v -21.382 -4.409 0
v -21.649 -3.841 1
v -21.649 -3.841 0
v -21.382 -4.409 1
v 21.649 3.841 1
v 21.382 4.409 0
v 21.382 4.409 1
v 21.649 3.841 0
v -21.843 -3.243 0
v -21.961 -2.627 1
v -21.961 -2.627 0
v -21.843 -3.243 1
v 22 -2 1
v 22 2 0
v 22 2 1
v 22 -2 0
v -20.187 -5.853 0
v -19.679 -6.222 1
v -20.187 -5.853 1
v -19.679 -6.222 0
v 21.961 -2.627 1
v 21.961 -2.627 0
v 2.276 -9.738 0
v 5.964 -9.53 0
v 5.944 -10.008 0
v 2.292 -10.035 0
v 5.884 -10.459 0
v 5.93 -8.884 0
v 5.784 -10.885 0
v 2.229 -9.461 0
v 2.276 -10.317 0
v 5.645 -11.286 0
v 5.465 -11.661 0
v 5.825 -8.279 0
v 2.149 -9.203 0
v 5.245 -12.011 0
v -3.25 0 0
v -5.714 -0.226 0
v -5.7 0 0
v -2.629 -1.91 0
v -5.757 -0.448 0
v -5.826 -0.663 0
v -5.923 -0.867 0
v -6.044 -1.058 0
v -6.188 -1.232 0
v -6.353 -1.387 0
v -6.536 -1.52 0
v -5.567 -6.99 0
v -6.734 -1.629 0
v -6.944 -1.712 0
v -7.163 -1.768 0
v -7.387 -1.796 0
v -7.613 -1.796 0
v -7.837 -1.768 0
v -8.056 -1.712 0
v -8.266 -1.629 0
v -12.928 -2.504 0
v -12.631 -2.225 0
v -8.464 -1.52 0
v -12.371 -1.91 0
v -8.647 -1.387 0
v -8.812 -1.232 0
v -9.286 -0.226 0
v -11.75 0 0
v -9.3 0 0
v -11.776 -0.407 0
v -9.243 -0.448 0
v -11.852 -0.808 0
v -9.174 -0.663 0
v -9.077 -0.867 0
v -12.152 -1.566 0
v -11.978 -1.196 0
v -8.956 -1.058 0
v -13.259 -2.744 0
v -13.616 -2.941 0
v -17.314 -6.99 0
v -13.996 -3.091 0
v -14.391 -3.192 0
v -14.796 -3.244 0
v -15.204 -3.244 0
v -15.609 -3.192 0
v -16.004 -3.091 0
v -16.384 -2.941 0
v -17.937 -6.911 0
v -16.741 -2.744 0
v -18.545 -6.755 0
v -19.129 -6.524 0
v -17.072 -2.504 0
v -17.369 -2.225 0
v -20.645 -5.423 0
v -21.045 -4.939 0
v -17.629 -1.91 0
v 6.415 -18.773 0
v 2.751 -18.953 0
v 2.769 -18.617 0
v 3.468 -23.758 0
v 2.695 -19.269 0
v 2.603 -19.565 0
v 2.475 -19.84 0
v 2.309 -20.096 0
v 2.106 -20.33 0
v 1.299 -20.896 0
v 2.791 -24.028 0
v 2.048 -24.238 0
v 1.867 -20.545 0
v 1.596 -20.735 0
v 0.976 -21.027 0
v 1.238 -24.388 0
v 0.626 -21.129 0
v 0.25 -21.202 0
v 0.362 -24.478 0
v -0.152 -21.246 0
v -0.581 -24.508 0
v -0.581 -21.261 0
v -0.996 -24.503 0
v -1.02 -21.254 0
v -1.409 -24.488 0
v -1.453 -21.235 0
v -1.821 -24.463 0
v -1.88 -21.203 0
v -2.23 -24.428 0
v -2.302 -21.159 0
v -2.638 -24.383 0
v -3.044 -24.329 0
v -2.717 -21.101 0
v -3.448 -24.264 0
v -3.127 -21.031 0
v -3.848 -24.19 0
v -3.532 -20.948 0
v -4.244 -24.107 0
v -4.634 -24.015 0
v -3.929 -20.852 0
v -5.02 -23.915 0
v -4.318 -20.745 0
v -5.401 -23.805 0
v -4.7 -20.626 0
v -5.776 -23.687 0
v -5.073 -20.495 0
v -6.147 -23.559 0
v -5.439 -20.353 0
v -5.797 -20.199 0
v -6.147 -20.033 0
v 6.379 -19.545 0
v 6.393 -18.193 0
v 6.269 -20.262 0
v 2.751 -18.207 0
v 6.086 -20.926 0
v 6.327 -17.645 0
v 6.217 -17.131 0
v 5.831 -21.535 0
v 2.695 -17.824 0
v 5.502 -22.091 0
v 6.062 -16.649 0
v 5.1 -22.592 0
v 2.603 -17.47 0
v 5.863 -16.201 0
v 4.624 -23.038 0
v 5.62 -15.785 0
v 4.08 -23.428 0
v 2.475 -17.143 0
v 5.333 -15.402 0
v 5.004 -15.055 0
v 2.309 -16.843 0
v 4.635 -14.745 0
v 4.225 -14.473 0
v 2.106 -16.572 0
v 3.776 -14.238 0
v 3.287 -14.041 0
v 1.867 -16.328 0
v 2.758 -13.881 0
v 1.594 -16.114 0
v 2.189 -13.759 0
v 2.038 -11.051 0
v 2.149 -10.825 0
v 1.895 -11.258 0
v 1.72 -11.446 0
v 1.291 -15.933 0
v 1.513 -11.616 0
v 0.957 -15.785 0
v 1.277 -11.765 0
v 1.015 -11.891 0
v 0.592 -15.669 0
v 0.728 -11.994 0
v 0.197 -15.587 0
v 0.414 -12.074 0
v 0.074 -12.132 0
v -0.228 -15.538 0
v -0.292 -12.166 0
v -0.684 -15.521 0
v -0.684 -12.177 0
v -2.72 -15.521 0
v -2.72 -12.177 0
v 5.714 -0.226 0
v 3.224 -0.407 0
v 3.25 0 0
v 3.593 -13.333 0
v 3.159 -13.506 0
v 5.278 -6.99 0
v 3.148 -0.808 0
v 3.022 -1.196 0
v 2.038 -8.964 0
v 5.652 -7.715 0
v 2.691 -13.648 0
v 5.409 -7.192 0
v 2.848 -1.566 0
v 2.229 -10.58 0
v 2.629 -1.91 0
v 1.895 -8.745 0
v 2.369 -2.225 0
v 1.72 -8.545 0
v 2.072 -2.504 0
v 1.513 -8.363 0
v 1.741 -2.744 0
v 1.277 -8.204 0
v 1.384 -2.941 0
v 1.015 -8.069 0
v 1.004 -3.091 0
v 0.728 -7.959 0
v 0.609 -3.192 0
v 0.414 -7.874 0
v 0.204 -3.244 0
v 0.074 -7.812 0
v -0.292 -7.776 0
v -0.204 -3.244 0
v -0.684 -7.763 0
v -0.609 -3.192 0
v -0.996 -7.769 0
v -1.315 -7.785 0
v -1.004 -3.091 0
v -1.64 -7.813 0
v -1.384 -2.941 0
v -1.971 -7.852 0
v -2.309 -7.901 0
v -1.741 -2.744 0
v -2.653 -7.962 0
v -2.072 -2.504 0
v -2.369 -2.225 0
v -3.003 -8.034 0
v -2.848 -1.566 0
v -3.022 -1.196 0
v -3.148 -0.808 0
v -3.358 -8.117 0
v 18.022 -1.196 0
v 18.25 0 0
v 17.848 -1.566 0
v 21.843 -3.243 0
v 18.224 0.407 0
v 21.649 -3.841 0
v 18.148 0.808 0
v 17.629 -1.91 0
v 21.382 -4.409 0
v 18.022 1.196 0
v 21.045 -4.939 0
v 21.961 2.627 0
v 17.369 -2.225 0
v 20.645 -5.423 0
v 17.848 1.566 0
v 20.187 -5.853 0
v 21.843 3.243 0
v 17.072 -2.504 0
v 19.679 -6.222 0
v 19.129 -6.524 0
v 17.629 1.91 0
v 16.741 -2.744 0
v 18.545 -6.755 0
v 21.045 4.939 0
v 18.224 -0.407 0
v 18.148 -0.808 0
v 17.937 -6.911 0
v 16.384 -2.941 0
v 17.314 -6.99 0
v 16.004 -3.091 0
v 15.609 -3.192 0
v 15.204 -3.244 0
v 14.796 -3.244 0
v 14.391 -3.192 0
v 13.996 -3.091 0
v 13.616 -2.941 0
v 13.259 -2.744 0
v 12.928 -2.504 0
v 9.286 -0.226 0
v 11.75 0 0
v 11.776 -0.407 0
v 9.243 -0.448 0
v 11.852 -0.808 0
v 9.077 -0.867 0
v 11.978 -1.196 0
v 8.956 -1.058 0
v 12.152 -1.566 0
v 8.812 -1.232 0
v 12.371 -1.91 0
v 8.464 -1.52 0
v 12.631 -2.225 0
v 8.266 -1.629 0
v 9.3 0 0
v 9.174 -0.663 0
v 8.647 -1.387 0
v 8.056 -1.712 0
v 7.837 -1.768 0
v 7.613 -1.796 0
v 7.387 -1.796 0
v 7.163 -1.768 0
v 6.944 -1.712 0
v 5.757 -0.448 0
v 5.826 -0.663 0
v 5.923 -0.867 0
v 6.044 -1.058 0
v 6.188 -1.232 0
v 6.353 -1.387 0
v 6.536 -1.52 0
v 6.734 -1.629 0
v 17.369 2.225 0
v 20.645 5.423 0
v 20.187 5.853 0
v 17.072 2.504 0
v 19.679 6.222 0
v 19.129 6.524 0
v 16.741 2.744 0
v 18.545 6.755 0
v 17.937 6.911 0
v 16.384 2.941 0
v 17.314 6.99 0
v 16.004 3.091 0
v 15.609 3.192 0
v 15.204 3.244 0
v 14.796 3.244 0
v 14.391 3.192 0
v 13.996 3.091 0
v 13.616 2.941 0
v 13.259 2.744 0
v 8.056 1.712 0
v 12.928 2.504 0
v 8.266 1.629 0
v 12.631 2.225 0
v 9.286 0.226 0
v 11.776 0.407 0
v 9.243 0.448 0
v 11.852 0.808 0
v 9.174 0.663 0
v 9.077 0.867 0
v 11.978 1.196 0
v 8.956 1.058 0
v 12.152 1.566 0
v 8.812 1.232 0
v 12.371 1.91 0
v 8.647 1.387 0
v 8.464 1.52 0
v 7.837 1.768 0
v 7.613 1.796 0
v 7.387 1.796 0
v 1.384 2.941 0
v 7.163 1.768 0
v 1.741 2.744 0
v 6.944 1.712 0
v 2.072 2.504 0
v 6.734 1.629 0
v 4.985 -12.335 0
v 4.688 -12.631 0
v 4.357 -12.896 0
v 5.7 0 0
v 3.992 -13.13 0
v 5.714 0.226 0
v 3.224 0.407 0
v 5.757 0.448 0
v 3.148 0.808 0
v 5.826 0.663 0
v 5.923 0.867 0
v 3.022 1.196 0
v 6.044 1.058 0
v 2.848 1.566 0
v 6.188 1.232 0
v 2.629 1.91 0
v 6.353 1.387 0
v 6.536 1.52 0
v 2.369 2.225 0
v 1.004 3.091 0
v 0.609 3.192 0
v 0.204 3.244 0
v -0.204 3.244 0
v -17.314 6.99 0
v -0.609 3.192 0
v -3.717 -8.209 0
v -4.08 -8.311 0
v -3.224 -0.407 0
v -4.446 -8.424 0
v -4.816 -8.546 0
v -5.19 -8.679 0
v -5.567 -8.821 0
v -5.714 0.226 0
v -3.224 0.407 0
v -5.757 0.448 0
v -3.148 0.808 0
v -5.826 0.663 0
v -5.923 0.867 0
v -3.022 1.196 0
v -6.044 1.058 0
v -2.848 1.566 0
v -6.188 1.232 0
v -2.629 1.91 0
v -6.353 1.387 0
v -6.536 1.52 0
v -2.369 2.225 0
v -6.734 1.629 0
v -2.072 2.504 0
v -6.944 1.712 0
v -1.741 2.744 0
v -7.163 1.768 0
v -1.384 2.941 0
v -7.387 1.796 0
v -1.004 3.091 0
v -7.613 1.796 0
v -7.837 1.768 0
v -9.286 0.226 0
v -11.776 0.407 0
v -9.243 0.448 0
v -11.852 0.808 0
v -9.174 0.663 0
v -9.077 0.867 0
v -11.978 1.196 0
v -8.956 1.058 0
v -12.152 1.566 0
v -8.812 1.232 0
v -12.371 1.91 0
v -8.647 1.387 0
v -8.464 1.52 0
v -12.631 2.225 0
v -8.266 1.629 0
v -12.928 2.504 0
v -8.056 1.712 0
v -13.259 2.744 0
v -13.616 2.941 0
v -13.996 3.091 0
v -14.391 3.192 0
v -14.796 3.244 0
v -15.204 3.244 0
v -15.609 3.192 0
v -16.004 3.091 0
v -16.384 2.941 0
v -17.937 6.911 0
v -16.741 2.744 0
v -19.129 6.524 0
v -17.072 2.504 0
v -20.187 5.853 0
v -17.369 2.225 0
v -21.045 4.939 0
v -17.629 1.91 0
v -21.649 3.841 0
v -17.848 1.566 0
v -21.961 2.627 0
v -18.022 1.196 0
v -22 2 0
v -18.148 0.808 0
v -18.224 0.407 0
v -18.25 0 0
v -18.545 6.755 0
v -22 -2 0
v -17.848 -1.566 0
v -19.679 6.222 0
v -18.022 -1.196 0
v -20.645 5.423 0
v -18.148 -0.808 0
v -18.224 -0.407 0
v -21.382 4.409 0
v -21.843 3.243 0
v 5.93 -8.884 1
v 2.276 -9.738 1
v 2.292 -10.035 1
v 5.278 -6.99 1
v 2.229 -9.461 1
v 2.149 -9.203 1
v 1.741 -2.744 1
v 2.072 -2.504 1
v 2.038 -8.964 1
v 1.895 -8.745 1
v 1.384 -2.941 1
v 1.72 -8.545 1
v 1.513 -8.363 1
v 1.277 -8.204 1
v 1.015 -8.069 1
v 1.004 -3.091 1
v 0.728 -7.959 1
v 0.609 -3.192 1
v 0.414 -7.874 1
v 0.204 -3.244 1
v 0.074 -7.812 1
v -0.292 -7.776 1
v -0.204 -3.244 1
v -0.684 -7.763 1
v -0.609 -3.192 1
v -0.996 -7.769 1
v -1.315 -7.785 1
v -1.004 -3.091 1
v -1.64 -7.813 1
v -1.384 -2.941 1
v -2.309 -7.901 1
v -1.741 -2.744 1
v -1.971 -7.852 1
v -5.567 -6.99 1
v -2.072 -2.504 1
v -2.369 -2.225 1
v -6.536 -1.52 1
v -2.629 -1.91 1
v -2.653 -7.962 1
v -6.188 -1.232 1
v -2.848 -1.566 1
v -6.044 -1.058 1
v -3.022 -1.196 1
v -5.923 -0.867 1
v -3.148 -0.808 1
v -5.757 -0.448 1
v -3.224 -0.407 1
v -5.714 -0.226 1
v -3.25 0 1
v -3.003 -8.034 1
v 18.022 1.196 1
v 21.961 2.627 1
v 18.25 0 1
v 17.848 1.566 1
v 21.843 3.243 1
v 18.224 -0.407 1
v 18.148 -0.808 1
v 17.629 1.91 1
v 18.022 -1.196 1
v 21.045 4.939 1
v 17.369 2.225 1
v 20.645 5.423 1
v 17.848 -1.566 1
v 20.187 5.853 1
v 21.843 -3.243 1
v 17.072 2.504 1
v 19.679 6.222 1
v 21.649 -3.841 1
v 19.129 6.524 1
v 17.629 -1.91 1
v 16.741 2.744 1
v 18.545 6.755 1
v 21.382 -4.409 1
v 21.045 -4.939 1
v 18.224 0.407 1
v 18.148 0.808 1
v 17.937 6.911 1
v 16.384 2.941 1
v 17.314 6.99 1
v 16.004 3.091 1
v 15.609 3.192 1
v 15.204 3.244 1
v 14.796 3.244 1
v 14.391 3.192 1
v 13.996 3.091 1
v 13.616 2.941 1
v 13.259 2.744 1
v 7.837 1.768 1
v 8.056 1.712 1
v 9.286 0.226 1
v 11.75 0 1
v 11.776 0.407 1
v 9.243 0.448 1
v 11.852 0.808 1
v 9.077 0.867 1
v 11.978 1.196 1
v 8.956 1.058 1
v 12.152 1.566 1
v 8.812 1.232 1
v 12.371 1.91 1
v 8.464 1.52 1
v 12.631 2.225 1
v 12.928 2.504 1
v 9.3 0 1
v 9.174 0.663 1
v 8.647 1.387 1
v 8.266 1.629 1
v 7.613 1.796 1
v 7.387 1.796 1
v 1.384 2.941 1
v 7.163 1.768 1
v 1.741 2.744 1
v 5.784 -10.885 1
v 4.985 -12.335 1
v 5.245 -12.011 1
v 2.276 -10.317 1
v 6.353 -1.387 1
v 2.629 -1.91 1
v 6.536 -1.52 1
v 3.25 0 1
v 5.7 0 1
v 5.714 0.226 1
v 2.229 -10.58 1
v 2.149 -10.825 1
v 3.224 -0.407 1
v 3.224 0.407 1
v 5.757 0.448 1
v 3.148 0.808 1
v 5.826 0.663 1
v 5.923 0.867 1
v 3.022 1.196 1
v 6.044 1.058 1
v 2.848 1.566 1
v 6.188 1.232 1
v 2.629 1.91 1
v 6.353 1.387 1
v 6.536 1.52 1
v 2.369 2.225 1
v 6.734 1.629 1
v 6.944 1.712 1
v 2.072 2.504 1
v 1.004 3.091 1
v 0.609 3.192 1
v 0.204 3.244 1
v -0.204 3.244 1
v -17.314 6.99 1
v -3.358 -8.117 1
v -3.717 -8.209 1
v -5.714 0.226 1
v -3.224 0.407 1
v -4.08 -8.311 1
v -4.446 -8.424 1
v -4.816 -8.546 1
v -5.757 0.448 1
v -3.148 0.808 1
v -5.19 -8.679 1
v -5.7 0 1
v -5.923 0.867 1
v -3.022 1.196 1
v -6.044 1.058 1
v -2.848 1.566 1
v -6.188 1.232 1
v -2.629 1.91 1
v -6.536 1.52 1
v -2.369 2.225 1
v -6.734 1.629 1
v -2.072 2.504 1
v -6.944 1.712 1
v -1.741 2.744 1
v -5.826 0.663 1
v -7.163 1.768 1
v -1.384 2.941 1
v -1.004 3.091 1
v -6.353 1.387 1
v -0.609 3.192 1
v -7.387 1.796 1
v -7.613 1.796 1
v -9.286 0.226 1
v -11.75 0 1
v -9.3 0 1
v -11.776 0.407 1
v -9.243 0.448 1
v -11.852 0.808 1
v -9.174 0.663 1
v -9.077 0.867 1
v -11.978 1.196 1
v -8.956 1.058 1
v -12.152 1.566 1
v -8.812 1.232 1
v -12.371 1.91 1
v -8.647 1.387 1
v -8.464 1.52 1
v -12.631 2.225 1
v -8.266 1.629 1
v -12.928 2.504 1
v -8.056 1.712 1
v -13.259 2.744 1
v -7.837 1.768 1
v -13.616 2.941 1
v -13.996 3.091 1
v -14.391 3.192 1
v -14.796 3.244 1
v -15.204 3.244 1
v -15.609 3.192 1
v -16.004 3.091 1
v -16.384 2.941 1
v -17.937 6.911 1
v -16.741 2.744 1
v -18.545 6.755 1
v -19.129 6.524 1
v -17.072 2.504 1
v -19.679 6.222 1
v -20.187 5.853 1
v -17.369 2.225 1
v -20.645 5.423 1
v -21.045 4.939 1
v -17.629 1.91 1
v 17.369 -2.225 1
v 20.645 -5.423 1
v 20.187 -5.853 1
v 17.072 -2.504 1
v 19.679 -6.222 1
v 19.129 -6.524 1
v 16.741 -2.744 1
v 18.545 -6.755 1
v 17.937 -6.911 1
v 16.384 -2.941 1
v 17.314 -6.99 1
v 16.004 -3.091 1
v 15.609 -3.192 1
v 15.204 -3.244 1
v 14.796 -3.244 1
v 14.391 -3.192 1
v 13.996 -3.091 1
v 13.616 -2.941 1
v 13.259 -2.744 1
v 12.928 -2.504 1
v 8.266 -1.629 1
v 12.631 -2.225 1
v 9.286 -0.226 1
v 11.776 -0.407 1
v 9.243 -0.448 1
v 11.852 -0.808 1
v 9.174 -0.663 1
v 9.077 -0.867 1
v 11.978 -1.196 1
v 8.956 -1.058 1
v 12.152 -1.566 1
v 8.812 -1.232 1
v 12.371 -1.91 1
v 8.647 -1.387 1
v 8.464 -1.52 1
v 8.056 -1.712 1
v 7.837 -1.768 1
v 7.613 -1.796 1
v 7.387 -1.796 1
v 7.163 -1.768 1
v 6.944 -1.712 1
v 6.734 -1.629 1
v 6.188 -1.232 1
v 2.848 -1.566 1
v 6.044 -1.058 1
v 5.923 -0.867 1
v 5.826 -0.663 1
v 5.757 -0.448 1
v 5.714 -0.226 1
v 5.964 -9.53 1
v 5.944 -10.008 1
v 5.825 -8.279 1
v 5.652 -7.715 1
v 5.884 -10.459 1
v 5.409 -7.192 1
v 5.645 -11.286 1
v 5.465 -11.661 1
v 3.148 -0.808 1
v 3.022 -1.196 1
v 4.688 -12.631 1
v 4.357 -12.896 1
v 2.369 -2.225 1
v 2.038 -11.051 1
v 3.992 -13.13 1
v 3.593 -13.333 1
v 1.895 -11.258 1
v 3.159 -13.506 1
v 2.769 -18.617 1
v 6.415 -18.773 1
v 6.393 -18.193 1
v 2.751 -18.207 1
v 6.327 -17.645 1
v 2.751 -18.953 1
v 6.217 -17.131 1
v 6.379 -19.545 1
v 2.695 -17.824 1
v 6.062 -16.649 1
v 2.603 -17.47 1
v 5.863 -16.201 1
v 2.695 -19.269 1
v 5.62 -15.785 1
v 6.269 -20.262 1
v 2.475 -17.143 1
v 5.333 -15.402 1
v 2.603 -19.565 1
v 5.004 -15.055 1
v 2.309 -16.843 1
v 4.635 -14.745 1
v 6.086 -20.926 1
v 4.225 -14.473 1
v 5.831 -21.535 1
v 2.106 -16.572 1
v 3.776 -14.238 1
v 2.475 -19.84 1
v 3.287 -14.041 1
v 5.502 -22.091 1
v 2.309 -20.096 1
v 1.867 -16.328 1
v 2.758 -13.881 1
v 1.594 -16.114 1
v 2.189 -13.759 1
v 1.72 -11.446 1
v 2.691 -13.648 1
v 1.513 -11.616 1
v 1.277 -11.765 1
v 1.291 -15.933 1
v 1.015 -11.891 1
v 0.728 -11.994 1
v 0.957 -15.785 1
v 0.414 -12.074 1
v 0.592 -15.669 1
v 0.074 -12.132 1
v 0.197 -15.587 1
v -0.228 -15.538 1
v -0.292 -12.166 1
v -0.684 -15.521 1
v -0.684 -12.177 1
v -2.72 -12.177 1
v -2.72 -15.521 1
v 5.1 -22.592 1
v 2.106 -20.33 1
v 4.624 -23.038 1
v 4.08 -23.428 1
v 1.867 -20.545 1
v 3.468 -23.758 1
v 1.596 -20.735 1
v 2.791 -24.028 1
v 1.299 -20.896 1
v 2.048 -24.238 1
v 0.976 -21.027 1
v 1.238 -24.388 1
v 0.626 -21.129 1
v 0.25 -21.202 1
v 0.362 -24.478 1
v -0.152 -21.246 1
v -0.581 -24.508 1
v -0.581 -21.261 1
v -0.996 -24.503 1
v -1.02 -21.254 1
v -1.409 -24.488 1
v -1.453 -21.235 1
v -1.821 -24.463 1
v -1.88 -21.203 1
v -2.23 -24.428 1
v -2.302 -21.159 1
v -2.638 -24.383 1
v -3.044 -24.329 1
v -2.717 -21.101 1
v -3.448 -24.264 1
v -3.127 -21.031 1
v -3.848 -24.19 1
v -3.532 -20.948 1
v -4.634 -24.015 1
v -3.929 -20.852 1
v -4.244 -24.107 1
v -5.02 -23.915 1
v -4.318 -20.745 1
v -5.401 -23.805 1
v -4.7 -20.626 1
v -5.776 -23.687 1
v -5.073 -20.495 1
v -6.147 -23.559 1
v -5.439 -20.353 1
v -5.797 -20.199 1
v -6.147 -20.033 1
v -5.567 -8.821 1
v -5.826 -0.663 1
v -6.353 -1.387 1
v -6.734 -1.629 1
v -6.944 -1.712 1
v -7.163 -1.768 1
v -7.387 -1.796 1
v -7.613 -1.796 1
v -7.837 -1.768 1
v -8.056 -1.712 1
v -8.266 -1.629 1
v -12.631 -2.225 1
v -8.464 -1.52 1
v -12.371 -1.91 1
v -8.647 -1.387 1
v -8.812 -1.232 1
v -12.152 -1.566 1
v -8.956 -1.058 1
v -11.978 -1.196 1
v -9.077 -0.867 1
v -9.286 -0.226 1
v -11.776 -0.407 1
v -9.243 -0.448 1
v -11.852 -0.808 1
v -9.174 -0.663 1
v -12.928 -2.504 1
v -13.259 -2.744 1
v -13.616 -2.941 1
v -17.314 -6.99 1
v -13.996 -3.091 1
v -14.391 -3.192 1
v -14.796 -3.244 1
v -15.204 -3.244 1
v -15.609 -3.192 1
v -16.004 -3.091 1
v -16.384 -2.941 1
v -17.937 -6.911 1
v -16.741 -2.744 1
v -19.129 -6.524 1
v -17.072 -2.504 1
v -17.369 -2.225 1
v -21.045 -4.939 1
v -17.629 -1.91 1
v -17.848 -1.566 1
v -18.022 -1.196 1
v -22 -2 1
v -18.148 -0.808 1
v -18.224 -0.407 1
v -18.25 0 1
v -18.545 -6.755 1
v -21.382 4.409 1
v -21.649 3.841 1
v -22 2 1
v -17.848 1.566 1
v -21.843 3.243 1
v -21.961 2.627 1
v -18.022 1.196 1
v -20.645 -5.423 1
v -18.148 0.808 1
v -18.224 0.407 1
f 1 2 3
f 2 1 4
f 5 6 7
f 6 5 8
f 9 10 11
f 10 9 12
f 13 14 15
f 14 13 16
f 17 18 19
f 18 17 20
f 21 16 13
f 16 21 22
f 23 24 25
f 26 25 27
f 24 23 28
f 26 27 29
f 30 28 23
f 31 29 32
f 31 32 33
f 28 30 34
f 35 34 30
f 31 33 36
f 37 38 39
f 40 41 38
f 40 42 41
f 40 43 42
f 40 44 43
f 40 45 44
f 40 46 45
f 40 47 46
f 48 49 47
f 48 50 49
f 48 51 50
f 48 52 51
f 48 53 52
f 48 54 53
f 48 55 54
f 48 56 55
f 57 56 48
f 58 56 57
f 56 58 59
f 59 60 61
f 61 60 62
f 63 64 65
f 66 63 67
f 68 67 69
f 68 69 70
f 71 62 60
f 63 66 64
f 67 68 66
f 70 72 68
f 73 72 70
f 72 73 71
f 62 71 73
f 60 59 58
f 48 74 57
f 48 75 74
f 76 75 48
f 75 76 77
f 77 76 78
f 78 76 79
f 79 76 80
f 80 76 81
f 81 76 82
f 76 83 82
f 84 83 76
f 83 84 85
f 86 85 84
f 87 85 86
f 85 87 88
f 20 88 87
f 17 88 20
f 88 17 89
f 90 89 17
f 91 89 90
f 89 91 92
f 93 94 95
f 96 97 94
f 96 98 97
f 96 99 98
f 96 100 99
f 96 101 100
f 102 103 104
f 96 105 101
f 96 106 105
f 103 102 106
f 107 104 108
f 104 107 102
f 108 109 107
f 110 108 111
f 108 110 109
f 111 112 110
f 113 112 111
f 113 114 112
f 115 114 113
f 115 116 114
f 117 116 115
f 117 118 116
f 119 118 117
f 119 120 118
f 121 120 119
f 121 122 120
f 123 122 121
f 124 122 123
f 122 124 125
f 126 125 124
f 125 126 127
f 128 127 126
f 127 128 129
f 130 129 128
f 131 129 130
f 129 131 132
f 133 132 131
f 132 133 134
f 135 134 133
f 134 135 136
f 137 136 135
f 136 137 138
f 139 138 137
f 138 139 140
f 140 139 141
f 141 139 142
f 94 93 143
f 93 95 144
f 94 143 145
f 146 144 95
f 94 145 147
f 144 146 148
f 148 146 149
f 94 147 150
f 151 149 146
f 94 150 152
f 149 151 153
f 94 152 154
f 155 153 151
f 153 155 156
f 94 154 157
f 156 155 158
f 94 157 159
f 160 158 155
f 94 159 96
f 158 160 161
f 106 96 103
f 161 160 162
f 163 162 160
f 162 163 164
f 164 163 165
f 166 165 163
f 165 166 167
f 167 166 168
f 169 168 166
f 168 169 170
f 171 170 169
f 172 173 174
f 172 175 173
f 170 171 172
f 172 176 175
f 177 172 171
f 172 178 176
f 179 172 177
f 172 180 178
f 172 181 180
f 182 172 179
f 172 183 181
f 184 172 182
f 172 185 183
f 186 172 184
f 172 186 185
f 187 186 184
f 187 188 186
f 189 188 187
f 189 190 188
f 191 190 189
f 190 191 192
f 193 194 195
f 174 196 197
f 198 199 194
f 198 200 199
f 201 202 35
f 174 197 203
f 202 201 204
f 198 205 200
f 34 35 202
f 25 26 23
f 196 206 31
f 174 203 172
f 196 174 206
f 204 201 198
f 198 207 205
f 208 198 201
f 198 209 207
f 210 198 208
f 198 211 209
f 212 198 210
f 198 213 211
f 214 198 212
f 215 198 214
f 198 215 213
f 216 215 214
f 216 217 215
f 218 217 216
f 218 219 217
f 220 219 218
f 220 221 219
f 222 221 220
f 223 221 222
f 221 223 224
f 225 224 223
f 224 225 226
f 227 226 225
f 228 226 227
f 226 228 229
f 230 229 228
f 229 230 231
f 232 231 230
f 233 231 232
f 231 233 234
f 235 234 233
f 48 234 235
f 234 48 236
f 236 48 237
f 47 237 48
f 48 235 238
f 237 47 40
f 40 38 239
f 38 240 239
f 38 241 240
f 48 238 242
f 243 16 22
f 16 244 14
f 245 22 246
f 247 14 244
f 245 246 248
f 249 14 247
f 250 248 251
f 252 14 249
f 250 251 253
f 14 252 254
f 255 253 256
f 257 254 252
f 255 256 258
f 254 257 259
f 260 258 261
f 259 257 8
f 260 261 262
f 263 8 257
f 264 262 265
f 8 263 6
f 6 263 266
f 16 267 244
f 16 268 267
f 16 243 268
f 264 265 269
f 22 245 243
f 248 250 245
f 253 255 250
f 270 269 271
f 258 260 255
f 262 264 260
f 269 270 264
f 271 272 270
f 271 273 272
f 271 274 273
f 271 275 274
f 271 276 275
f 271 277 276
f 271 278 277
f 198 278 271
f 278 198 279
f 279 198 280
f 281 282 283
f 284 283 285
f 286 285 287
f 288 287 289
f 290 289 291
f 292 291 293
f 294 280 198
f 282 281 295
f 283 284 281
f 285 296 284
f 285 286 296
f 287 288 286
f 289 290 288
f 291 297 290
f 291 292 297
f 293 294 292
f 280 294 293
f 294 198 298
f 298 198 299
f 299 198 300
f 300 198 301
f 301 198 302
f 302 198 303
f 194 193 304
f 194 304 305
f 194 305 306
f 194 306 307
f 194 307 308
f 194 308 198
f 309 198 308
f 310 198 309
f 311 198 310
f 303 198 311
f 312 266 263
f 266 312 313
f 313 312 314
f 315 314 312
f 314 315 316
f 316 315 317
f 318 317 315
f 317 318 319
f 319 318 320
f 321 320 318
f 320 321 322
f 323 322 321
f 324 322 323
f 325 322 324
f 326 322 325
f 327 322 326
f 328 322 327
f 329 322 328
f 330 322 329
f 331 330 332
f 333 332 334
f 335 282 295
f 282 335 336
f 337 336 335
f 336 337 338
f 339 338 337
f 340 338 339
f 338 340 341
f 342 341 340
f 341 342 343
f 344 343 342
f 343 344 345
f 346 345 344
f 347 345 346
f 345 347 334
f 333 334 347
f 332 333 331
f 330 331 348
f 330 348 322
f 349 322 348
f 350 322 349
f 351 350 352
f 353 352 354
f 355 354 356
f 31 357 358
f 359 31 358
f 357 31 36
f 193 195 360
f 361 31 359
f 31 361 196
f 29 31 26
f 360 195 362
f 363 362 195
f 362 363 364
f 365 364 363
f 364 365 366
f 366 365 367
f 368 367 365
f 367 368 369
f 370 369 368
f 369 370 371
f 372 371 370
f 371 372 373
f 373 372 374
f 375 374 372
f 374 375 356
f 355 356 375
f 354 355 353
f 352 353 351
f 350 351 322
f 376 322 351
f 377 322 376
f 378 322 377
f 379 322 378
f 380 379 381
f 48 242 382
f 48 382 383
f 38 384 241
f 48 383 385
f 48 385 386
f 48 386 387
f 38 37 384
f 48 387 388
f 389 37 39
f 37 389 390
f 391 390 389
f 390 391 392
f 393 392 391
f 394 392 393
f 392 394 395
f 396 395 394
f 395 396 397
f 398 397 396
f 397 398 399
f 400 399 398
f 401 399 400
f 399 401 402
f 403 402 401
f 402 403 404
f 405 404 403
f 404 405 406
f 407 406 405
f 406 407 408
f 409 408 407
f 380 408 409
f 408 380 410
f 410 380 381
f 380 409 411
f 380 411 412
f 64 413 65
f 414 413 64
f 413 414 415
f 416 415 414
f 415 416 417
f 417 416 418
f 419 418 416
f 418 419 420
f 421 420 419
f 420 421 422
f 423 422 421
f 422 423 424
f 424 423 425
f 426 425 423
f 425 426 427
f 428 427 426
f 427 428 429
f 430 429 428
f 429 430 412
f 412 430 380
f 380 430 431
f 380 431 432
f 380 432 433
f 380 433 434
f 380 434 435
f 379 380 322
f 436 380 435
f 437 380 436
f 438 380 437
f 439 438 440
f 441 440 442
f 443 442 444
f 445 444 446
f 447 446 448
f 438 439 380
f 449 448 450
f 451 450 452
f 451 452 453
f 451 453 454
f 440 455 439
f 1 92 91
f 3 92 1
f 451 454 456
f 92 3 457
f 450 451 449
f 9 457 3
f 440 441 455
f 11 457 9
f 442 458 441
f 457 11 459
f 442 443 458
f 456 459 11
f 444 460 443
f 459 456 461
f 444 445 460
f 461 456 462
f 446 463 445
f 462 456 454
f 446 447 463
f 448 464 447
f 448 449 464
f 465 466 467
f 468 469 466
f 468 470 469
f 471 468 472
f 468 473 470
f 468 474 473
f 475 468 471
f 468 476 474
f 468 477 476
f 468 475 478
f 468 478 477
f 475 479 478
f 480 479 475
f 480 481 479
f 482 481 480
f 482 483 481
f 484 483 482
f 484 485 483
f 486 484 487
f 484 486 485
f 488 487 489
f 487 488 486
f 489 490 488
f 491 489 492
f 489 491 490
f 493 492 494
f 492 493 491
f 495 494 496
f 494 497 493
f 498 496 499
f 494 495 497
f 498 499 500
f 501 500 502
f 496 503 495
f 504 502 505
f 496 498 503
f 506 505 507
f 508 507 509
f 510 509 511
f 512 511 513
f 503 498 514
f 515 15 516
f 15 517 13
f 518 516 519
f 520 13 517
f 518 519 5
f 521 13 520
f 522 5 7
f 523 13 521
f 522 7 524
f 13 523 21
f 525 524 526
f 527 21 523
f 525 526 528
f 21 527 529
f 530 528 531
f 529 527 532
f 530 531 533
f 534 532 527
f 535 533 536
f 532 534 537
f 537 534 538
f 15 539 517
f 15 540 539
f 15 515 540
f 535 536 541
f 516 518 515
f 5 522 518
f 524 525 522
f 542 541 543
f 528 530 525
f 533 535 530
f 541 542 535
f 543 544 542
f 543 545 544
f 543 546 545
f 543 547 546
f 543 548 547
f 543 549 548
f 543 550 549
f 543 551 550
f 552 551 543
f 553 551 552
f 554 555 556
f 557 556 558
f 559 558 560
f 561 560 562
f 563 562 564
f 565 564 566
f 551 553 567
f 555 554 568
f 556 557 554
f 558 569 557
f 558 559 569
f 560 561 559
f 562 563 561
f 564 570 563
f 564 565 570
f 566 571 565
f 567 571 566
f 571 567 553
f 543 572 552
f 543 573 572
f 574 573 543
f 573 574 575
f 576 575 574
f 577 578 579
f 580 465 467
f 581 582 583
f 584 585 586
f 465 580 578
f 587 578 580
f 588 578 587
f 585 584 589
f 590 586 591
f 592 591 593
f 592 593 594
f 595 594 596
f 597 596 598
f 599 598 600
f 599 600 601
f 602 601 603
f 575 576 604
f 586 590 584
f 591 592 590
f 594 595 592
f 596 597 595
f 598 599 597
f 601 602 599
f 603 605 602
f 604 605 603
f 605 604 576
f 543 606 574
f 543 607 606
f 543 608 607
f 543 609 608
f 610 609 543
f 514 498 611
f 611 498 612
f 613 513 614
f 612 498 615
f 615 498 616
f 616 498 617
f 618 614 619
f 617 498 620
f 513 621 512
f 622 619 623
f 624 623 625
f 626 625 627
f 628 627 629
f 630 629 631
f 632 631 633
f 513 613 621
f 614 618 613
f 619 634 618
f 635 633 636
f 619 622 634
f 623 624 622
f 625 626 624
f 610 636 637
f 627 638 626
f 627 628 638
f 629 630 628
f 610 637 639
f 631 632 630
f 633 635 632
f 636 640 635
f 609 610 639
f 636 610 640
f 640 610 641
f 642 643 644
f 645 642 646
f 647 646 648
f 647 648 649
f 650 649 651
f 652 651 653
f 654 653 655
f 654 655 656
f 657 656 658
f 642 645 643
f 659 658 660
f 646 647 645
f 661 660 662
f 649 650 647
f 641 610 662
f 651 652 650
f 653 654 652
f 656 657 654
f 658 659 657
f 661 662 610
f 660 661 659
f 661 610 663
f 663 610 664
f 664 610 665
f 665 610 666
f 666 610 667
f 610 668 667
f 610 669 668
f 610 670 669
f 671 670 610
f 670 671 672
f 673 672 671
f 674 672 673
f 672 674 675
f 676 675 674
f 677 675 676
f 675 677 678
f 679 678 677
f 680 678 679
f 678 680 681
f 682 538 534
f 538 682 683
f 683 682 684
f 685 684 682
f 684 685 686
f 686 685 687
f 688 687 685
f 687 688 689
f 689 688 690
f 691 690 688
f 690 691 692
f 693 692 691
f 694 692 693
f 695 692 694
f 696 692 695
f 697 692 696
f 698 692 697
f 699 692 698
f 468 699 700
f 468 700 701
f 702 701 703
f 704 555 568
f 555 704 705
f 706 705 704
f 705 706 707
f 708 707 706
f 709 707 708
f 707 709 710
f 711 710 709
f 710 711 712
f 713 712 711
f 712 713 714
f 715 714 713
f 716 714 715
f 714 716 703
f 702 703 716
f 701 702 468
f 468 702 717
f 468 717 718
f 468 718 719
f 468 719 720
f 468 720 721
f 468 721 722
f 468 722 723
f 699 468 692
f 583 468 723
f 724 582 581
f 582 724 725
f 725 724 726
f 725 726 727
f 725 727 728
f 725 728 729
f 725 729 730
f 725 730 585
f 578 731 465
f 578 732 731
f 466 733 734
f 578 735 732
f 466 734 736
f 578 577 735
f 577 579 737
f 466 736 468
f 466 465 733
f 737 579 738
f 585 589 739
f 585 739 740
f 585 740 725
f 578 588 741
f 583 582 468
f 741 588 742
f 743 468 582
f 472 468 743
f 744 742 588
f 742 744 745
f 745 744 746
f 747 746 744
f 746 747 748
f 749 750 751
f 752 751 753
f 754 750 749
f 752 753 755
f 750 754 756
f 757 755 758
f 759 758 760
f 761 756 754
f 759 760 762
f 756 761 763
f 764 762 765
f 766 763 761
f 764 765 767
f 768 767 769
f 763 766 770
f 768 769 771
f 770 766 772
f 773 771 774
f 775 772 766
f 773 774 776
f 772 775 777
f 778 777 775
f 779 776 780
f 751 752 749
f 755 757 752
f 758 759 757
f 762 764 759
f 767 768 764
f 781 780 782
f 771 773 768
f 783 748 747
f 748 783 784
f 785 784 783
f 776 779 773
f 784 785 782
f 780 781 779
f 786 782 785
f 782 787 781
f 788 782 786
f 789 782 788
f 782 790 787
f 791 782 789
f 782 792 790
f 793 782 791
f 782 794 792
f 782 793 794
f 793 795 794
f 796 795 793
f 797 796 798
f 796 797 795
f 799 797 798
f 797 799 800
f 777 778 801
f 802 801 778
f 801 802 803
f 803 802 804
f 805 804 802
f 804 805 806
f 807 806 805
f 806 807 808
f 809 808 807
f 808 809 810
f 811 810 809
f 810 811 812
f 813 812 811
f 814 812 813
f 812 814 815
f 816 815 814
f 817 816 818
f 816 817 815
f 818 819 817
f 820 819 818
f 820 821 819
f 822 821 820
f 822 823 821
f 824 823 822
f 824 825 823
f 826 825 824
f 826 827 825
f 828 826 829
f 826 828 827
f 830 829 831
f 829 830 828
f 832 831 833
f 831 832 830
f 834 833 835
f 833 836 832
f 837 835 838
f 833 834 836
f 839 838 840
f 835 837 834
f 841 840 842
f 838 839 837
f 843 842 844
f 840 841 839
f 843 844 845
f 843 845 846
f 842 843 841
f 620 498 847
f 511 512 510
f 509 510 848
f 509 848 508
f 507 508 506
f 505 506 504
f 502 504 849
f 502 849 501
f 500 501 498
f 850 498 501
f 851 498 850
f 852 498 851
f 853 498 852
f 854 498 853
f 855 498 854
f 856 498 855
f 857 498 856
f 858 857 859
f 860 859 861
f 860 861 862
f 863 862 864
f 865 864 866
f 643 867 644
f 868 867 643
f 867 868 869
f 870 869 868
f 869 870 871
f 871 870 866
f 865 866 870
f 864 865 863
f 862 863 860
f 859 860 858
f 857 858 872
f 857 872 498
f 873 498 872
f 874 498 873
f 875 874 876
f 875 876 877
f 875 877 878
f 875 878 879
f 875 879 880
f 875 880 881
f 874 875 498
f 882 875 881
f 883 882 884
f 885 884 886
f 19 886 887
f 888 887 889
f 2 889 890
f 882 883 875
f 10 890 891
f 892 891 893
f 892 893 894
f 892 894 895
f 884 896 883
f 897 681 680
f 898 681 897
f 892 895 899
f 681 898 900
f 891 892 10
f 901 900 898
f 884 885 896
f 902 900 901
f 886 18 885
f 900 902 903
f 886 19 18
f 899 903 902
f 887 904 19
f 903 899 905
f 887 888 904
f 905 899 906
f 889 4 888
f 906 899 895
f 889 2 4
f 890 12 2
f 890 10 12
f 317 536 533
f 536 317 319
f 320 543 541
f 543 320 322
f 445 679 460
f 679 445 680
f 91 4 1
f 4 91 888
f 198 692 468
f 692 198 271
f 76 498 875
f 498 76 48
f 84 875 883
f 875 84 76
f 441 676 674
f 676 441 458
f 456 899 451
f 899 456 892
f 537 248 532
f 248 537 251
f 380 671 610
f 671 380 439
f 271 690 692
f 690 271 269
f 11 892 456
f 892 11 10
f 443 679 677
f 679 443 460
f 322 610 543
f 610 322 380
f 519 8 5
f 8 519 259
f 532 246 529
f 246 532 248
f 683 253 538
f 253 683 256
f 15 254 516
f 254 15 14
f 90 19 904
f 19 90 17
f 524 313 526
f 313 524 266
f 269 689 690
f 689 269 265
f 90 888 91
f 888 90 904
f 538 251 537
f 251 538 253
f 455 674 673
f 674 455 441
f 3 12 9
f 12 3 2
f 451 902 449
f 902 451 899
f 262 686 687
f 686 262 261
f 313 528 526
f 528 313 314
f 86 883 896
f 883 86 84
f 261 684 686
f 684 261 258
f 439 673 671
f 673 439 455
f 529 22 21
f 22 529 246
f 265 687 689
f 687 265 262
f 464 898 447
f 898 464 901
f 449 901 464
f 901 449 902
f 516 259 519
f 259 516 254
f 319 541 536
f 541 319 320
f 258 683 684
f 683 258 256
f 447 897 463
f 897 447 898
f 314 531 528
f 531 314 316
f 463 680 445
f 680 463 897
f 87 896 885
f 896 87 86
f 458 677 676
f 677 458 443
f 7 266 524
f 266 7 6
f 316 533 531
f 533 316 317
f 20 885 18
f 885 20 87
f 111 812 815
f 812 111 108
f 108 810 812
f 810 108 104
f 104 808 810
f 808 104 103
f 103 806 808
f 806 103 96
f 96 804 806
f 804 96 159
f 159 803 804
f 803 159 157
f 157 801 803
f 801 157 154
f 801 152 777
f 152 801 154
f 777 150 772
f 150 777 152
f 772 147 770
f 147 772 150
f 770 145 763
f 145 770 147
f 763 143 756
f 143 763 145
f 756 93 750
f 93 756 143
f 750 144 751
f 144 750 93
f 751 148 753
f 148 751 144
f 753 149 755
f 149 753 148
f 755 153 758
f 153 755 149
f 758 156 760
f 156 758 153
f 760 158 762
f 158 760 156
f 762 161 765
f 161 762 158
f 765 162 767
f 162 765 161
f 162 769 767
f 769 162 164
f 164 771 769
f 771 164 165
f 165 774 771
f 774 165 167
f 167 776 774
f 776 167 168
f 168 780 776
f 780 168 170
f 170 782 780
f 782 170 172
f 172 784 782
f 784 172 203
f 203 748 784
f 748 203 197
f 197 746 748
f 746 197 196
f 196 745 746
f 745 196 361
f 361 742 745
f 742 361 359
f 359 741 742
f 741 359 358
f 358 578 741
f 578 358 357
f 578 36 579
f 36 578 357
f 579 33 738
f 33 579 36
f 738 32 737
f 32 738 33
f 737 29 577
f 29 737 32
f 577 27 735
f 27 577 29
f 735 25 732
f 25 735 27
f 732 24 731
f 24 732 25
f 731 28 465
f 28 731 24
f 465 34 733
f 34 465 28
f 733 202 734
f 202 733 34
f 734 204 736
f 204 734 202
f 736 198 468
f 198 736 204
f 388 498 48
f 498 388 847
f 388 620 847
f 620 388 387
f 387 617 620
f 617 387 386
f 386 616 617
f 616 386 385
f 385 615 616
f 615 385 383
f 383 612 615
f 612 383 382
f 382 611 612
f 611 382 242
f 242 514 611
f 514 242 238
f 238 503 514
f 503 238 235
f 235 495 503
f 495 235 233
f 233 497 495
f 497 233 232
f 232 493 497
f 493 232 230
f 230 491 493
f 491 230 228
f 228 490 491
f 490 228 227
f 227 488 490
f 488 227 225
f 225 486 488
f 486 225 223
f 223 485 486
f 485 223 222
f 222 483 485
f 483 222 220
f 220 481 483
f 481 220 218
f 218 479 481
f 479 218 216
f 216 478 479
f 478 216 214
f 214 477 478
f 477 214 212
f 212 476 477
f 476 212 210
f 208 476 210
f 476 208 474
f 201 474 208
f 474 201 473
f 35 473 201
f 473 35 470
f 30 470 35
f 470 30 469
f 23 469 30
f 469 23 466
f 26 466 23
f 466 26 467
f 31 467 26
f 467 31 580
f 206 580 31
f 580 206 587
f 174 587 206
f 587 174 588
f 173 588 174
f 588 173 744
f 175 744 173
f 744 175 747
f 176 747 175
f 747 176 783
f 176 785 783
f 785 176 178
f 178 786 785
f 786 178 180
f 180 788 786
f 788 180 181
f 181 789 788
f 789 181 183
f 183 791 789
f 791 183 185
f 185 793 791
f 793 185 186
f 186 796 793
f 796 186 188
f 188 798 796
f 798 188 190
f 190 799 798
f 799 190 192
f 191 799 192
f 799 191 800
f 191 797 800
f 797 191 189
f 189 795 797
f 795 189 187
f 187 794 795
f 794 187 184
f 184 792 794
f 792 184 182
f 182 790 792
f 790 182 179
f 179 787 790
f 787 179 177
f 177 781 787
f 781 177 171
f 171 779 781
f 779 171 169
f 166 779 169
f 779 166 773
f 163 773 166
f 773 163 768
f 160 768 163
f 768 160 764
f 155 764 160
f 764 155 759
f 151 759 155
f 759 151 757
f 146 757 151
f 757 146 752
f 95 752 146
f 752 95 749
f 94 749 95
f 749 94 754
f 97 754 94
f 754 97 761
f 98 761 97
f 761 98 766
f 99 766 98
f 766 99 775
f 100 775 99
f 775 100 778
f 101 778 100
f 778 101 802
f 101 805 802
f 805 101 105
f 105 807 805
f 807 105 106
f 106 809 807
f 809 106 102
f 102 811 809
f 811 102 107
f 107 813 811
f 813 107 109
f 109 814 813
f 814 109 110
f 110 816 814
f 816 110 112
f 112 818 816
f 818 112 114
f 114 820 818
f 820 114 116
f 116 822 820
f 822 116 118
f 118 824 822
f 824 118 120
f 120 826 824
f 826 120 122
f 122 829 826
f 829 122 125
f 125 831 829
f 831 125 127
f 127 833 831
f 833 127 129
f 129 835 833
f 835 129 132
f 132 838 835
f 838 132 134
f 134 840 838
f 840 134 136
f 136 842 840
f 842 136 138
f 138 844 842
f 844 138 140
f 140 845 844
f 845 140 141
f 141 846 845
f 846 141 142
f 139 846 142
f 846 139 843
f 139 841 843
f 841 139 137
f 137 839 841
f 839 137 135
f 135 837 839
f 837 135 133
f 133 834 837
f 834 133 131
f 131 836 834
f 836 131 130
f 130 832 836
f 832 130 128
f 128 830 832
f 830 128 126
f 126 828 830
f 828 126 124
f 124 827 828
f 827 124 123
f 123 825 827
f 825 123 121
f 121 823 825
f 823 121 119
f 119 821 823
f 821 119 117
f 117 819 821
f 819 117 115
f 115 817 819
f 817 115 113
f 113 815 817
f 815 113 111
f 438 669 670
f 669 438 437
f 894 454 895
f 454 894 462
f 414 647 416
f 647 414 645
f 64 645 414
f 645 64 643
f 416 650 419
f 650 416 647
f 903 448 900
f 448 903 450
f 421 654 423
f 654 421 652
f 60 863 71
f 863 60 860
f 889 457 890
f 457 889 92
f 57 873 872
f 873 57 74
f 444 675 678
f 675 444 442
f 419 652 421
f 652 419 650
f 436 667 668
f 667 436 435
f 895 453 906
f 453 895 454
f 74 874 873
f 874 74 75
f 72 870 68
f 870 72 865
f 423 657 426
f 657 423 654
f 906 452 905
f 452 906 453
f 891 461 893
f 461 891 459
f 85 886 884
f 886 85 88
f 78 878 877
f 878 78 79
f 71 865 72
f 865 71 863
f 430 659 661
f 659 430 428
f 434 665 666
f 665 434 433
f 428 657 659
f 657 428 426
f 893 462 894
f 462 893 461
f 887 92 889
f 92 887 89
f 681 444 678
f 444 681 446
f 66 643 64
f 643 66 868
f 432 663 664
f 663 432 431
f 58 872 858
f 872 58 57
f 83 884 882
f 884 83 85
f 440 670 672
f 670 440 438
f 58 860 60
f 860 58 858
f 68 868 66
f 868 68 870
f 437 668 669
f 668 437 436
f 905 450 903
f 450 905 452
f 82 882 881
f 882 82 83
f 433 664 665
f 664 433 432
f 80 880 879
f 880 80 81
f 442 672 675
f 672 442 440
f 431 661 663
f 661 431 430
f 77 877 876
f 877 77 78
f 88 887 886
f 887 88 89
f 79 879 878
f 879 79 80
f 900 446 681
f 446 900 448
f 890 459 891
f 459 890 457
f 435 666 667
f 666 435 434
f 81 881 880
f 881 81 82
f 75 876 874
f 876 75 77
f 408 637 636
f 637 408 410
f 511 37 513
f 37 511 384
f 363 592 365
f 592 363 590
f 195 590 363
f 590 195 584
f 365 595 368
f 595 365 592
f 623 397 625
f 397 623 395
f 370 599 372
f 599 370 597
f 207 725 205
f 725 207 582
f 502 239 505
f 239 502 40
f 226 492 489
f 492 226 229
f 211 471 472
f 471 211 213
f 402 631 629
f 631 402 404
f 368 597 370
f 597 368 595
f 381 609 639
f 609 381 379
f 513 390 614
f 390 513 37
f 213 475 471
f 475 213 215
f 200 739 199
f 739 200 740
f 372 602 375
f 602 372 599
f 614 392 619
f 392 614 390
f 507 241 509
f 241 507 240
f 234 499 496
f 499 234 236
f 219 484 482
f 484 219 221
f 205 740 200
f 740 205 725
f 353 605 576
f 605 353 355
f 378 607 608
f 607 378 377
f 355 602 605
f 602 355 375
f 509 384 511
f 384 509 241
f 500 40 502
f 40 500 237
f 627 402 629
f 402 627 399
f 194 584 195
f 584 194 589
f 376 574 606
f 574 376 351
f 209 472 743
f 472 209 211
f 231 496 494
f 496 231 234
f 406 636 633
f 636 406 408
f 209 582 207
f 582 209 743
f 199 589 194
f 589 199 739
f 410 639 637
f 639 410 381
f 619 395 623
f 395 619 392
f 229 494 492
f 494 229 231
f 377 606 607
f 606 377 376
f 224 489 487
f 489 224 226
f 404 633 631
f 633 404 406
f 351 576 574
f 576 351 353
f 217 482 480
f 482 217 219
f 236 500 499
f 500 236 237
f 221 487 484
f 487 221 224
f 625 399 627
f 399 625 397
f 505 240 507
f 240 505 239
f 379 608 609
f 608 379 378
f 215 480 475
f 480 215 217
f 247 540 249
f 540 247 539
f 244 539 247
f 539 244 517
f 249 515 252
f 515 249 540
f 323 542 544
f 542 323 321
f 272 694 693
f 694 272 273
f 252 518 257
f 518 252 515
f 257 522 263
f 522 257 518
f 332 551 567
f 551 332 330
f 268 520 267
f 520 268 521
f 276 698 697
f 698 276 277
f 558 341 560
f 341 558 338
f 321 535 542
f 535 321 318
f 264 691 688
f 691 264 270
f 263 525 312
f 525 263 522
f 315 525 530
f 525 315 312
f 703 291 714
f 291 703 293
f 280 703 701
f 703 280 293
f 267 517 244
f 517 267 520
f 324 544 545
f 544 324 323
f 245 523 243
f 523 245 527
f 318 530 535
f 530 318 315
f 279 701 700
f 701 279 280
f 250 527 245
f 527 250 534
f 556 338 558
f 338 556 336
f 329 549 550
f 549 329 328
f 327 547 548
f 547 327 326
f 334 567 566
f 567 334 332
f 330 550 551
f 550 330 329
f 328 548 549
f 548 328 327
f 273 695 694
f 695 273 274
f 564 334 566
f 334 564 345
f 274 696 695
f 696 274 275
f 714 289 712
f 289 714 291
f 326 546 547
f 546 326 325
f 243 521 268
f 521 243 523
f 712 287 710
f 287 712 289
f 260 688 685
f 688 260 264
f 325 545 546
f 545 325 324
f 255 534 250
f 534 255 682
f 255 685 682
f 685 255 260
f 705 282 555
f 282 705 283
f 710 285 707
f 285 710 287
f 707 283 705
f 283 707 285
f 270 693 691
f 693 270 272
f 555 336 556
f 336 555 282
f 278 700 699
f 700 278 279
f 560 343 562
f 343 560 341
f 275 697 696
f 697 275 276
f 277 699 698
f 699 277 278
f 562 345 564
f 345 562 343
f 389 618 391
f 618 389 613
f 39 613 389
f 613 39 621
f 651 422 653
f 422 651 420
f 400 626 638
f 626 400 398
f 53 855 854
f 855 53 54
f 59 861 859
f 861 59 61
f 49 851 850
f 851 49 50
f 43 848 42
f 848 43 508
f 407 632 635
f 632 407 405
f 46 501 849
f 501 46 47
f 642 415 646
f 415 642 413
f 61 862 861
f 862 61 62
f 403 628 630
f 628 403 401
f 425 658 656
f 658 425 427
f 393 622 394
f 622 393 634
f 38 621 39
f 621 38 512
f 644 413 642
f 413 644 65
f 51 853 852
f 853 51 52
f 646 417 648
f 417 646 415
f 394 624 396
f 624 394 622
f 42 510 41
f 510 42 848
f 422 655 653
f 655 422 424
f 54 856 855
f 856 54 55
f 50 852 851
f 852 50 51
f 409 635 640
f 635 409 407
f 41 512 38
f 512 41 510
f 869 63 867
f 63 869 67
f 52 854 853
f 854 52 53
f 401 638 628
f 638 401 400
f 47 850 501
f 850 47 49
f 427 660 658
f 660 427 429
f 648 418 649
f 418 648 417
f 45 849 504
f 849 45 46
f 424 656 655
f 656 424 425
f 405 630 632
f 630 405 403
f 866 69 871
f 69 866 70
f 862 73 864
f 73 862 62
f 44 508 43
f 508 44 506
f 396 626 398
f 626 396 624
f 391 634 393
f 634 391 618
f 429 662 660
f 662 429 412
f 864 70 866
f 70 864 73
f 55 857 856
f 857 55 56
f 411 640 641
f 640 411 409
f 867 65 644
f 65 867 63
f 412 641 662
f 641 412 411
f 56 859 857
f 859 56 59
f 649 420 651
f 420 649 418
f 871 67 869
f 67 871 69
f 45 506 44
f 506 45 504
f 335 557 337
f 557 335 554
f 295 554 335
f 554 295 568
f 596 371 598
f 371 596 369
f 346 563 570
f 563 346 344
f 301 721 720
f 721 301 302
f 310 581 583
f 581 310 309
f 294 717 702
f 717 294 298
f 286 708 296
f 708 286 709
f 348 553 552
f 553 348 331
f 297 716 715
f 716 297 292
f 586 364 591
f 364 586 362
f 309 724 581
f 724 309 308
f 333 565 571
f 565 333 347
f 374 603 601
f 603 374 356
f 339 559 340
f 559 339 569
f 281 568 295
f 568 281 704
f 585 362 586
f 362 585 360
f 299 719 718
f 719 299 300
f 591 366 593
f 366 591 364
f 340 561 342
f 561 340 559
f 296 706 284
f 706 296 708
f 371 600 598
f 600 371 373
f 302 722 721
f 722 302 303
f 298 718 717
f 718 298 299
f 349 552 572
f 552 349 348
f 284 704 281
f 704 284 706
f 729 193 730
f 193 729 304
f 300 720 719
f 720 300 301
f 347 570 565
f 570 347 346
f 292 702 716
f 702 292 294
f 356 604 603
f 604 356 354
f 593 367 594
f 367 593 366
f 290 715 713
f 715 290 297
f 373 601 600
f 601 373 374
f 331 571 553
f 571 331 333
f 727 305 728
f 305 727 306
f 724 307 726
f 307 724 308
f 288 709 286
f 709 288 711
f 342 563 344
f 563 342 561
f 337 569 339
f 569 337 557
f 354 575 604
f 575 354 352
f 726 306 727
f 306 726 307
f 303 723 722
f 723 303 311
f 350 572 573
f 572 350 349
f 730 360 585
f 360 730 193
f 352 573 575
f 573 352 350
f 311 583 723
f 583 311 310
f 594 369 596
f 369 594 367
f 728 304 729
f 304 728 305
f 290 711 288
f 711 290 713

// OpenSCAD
$fn = 50;


difference() {
	union() {
		*color(alpha = 1.0000000000, c = "gray") {
			translate(v = [0, 14, 0]) {
				linear_extrude(height = 1) {
					text(font = "Arial:style=Bold", halign = "center", size = 4.5000000000, text = "COMMENT description oobb_plate_shape_p_type_1_depth_3_width_1_thickness_3_extra_oobb_size", valign = "center");
				}
			}
		}
		hull() {
			translate(v = [-17.0000000000, 2.0000000000, 0]) {
				cylinder(h = 1, r = 5);
			}
			translate(v = [17.0000000000, 2.0000000000, 0]) {
				cylinder(h = 1, r = 5);
			}
			translate(v = [-17.0000000000, -2.0000000000, 0]) {
				cylinder(h = 1, r = 5);
			}
			translate(v = [17.0000000000, -2.0000000000, 0]) {
				cylinder(h = 1, r = 5);
			}
		}
		translate(v = [0, -5, 0]) {
			linear_extrude(height = 1) {
				text(font = "DejaVu Sans Mono:style=Bold", halign = "center", size = 19.0000000000, text = "3", valign = "top");
			}
		}
	}
	union() {
		*color(alpha = 1.0000000000, c = "gray") {
			translate(v = [0, 14, 0]) {
				linear_extrude(height = 1) {
					text(font = "Arial:style=Bold", halign = "center", size = 4.5000000000, text = "COMMENT description oobb_holes_shape_n_type_3_width_1_thickness_3_extra_oobb_size_1_height_'all'_holes_true_both_holes", valign = "center");
				}
			}
		}
		translate(v = [-15.0000000000, 0.0000000000, 0]) {
			translate(v = [0, 0, -50]) {
				cylinder(h = 100, r = 3.2500000000);
			}
		}
		translate(v = [0, 0, -50]) {
			cylinder(h = 100, r = 3.2500000000);
		}
		translate(v = [15.0000000000, 0.0000000000, 0]) {
			translate(v = [0, 0, -50]) {
				cylinder(h = 100, r = 3.2500000000);
			}
		}
		translate(v = [-15.0000000000, 0.0000000000, 0]) {
			translate(v = [0, 0, -50]) {
				cylinder(h = 100, r = 1.8000000000);
			}
		}
		translate(v = [-7.5000000000, 0.0000000000, 0]) {
			translate(v = [0, 0, -50]) {
				cylinder(h = 100, r = 1.8000000000);
			}
		}
		translate(v = [0, 0, -50]) {
			cylinder(h = 100, r = 1.8000000000);
		}
		translate(v = [7.5000000000, 0.0000000000, 0]) {
			translate(v = [0, 0, -50]) {
				cylinder(h = 100, r = 1.8000000000);
			}
		}
		translate(v = [15.0000000000, 0.0000000000, 0]) {
			translate(v = [0, 0, -50]) {
				cylinder(h = 100, r = 1.8000000000);
			}
		}
	}
}
